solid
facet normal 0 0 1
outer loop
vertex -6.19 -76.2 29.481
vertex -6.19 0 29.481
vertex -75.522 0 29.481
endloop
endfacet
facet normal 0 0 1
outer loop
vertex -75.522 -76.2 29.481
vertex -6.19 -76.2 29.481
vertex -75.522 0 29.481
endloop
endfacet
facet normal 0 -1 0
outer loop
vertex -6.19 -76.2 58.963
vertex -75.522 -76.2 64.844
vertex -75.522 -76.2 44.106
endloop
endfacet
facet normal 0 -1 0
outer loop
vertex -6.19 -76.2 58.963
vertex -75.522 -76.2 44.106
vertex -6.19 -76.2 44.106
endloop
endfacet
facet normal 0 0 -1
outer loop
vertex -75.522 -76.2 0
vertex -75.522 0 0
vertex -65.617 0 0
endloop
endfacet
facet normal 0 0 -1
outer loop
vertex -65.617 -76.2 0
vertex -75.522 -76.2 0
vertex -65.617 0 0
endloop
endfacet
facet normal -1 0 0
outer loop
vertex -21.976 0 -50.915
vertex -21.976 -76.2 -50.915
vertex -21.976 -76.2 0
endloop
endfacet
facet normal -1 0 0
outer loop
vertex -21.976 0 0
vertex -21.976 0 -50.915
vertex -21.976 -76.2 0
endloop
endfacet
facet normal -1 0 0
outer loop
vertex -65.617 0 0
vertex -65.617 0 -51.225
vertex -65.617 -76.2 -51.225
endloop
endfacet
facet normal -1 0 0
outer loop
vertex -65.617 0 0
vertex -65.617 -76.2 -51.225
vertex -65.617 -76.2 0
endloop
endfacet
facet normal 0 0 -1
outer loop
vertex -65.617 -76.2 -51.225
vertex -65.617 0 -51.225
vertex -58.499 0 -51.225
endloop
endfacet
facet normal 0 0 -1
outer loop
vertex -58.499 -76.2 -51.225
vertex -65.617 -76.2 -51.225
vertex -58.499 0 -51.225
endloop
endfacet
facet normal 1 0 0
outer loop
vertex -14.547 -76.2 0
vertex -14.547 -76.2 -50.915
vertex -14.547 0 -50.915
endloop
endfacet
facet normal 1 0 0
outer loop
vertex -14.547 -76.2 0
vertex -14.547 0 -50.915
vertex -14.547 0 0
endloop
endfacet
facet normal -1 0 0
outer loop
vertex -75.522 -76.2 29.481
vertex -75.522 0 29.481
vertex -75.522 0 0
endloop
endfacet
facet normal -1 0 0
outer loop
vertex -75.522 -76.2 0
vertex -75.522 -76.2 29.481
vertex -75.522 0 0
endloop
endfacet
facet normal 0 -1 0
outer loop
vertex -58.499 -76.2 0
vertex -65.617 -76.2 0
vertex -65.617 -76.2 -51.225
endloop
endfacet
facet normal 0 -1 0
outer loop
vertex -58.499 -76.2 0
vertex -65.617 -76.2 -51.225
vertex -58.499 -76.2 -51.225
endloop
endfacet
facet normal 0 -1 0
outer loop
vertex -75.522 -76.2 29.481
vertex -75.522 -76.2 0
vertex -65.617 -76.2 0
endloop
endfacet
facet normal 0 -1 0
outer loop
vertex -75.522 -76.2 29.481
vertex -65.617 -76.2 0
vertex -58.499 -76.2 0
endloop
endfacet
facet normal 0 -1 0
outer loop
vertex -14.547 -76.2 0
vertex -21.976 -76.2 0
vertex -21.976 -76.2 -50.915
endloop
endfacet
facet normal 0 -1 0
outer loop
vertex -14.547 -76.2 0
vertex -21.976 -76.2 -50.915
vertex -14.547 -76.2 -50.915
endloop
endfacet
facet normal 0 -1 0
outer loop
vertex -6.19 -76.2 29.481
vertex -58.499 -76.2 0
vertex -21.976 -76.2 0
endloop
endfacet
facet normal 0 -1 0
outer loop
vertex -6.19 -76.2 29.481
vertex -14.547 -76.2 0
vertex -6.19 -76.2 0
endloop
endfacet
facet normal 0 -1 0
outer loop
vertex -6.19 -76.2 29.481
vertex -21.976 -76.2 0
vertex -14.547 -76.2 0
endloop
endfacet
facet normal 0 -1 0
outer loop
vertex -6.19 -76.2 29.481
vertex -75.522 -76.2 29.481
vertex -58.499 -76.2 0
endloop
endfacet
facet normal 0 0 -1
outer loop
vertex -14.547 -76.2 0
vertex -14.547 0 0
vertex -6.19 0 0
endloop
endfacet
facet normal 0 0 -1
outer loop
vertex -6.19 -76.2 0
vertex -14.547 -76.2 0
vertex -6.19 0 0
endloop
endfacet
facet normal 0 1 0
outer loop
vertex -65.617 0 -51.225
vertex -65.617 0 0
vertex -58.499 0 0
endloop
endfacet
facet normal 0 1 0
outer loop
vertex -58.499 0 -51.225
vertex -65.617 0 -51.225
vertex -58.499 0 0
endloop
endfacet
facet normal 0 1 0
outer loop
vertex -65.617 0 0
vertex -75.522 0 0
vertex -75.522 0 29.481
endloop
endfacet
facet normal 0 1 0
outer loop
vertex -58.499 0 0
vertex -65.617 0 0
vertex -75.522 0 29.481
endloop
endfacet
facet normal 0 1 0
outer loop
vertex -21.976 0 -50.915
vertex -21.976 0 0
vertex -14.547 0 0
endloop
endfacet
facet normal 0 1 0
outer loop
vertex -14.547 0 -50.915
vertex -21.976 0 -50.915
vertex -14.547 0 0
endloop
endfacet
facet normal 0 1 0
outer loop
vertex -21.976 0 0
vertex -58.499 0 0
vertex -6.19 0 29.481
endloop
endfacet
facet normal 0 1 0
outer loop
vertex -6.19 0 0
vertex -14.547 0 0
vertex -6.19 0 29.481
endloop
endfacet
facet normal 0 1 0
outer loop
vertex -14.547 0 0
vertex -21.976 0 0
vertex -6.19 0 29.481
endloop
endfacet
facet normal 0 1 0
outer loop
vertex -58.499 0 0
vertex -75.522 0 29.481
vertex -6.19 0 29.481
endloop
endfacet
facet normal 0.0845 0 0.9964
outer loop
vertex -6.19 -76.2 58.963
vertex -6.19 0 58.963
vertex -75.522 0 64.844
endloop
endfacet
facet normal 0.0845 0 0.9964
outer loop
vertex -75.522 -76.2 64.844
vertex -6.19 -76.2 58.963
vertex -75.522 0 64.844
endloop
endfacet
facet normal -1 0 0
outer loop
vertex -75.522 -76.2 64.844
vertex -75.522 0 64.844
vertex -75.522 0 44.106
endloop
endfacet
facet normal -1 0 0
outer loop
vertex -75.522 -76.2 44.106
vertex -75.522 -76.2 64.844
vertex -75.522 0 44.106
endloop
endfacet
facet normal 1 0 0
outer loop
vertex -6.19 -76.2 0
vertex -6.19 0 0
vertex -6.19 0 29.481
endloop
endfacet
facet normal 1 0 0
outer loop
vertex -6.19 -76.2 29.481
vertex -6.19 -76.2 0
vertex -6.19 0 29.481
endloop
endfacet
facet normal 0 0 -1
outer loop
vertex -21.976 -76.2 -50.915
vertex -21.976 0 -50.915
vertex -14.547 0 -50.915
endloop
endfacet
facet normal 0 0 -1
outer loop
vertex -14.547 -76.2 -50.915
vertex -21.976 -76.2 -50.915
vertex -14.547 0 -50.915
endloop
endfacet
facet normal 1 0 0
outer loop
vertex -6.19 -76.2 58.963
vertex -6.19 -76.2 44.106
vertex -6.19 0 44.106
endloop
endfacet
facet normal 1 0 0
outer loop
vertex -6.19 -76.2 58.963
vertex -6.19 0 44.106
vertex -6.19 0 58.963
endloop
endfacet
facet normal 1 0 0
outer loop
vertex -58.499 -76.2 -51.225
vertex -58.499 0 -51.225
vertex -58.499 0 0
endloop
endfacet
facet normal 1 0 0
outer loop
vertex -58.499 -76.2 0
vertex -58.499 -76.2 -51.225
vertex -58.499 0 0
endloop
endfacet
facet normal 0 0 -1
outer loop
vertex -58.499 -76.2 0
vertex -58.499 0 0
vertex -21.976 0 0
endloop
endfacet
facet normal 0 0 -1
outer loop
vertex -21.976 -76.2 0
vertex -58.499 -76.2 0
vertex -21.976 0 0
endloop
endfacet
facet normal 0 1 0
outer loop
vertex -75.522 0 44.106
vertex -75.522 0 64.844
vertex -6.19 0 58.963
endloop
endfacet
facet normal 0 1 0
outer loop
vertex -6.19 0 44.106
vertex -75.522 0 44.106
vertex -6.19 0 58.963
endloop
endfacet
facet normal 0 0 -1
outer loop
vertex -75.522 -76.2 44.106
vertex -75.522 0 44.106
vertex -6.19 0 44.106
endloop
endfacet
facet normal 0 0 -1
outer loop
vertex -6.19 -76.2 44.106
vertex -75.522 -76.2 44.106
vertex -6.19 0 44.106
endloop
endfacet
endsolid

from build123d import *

# Parameters (mm, degrees)
F1_DEPTH = 76.2
F0_W     = 7.118877
F0_H     = 51.224969
F2_DEPTH = 76.2
F0_W_2   = 7.428395
F0_H_2   = 50.915454
F3_DEPTH = 76.2


with BuildPart() as f1:
    # F0 (on Front) → F1 (new body)
    with BuildSketch(Plane.XZ):
        Polygon((-75.522013, 64.843699), (-75.522013, 44.106092), (-6.19033, 44.106092), (-6.19033, 58.962882), align=None)
        Polygon((-75.522013, 0), (-65.617487, 0), (-58.49861, 0), (-21.975668, 0), (-14.547273, 0), (-6.19033, 0), (-6.19033, 29.481441), (-75.522013, 29.481441), align=None)
    extrude(amount=F1_DEPTH)

    # F0 (on Front) → F2 (join)
    with BuildSketch(Plane.XZ):
        with Locations((-62.058048, -25.612484)):
            Rectangle(F0_W, F0_H)
    extrude(amount=F2_DEPTH)

    # F0 (on Front) → F3 (join)
    with BuildSketch(Plane.XZ):
        with Locations((-18.26147, -25.457727)):
            Rectangle(F0_W_2, F0_H_2)
    extrude(amount=F3_DEPTH)


solid = f1.part
